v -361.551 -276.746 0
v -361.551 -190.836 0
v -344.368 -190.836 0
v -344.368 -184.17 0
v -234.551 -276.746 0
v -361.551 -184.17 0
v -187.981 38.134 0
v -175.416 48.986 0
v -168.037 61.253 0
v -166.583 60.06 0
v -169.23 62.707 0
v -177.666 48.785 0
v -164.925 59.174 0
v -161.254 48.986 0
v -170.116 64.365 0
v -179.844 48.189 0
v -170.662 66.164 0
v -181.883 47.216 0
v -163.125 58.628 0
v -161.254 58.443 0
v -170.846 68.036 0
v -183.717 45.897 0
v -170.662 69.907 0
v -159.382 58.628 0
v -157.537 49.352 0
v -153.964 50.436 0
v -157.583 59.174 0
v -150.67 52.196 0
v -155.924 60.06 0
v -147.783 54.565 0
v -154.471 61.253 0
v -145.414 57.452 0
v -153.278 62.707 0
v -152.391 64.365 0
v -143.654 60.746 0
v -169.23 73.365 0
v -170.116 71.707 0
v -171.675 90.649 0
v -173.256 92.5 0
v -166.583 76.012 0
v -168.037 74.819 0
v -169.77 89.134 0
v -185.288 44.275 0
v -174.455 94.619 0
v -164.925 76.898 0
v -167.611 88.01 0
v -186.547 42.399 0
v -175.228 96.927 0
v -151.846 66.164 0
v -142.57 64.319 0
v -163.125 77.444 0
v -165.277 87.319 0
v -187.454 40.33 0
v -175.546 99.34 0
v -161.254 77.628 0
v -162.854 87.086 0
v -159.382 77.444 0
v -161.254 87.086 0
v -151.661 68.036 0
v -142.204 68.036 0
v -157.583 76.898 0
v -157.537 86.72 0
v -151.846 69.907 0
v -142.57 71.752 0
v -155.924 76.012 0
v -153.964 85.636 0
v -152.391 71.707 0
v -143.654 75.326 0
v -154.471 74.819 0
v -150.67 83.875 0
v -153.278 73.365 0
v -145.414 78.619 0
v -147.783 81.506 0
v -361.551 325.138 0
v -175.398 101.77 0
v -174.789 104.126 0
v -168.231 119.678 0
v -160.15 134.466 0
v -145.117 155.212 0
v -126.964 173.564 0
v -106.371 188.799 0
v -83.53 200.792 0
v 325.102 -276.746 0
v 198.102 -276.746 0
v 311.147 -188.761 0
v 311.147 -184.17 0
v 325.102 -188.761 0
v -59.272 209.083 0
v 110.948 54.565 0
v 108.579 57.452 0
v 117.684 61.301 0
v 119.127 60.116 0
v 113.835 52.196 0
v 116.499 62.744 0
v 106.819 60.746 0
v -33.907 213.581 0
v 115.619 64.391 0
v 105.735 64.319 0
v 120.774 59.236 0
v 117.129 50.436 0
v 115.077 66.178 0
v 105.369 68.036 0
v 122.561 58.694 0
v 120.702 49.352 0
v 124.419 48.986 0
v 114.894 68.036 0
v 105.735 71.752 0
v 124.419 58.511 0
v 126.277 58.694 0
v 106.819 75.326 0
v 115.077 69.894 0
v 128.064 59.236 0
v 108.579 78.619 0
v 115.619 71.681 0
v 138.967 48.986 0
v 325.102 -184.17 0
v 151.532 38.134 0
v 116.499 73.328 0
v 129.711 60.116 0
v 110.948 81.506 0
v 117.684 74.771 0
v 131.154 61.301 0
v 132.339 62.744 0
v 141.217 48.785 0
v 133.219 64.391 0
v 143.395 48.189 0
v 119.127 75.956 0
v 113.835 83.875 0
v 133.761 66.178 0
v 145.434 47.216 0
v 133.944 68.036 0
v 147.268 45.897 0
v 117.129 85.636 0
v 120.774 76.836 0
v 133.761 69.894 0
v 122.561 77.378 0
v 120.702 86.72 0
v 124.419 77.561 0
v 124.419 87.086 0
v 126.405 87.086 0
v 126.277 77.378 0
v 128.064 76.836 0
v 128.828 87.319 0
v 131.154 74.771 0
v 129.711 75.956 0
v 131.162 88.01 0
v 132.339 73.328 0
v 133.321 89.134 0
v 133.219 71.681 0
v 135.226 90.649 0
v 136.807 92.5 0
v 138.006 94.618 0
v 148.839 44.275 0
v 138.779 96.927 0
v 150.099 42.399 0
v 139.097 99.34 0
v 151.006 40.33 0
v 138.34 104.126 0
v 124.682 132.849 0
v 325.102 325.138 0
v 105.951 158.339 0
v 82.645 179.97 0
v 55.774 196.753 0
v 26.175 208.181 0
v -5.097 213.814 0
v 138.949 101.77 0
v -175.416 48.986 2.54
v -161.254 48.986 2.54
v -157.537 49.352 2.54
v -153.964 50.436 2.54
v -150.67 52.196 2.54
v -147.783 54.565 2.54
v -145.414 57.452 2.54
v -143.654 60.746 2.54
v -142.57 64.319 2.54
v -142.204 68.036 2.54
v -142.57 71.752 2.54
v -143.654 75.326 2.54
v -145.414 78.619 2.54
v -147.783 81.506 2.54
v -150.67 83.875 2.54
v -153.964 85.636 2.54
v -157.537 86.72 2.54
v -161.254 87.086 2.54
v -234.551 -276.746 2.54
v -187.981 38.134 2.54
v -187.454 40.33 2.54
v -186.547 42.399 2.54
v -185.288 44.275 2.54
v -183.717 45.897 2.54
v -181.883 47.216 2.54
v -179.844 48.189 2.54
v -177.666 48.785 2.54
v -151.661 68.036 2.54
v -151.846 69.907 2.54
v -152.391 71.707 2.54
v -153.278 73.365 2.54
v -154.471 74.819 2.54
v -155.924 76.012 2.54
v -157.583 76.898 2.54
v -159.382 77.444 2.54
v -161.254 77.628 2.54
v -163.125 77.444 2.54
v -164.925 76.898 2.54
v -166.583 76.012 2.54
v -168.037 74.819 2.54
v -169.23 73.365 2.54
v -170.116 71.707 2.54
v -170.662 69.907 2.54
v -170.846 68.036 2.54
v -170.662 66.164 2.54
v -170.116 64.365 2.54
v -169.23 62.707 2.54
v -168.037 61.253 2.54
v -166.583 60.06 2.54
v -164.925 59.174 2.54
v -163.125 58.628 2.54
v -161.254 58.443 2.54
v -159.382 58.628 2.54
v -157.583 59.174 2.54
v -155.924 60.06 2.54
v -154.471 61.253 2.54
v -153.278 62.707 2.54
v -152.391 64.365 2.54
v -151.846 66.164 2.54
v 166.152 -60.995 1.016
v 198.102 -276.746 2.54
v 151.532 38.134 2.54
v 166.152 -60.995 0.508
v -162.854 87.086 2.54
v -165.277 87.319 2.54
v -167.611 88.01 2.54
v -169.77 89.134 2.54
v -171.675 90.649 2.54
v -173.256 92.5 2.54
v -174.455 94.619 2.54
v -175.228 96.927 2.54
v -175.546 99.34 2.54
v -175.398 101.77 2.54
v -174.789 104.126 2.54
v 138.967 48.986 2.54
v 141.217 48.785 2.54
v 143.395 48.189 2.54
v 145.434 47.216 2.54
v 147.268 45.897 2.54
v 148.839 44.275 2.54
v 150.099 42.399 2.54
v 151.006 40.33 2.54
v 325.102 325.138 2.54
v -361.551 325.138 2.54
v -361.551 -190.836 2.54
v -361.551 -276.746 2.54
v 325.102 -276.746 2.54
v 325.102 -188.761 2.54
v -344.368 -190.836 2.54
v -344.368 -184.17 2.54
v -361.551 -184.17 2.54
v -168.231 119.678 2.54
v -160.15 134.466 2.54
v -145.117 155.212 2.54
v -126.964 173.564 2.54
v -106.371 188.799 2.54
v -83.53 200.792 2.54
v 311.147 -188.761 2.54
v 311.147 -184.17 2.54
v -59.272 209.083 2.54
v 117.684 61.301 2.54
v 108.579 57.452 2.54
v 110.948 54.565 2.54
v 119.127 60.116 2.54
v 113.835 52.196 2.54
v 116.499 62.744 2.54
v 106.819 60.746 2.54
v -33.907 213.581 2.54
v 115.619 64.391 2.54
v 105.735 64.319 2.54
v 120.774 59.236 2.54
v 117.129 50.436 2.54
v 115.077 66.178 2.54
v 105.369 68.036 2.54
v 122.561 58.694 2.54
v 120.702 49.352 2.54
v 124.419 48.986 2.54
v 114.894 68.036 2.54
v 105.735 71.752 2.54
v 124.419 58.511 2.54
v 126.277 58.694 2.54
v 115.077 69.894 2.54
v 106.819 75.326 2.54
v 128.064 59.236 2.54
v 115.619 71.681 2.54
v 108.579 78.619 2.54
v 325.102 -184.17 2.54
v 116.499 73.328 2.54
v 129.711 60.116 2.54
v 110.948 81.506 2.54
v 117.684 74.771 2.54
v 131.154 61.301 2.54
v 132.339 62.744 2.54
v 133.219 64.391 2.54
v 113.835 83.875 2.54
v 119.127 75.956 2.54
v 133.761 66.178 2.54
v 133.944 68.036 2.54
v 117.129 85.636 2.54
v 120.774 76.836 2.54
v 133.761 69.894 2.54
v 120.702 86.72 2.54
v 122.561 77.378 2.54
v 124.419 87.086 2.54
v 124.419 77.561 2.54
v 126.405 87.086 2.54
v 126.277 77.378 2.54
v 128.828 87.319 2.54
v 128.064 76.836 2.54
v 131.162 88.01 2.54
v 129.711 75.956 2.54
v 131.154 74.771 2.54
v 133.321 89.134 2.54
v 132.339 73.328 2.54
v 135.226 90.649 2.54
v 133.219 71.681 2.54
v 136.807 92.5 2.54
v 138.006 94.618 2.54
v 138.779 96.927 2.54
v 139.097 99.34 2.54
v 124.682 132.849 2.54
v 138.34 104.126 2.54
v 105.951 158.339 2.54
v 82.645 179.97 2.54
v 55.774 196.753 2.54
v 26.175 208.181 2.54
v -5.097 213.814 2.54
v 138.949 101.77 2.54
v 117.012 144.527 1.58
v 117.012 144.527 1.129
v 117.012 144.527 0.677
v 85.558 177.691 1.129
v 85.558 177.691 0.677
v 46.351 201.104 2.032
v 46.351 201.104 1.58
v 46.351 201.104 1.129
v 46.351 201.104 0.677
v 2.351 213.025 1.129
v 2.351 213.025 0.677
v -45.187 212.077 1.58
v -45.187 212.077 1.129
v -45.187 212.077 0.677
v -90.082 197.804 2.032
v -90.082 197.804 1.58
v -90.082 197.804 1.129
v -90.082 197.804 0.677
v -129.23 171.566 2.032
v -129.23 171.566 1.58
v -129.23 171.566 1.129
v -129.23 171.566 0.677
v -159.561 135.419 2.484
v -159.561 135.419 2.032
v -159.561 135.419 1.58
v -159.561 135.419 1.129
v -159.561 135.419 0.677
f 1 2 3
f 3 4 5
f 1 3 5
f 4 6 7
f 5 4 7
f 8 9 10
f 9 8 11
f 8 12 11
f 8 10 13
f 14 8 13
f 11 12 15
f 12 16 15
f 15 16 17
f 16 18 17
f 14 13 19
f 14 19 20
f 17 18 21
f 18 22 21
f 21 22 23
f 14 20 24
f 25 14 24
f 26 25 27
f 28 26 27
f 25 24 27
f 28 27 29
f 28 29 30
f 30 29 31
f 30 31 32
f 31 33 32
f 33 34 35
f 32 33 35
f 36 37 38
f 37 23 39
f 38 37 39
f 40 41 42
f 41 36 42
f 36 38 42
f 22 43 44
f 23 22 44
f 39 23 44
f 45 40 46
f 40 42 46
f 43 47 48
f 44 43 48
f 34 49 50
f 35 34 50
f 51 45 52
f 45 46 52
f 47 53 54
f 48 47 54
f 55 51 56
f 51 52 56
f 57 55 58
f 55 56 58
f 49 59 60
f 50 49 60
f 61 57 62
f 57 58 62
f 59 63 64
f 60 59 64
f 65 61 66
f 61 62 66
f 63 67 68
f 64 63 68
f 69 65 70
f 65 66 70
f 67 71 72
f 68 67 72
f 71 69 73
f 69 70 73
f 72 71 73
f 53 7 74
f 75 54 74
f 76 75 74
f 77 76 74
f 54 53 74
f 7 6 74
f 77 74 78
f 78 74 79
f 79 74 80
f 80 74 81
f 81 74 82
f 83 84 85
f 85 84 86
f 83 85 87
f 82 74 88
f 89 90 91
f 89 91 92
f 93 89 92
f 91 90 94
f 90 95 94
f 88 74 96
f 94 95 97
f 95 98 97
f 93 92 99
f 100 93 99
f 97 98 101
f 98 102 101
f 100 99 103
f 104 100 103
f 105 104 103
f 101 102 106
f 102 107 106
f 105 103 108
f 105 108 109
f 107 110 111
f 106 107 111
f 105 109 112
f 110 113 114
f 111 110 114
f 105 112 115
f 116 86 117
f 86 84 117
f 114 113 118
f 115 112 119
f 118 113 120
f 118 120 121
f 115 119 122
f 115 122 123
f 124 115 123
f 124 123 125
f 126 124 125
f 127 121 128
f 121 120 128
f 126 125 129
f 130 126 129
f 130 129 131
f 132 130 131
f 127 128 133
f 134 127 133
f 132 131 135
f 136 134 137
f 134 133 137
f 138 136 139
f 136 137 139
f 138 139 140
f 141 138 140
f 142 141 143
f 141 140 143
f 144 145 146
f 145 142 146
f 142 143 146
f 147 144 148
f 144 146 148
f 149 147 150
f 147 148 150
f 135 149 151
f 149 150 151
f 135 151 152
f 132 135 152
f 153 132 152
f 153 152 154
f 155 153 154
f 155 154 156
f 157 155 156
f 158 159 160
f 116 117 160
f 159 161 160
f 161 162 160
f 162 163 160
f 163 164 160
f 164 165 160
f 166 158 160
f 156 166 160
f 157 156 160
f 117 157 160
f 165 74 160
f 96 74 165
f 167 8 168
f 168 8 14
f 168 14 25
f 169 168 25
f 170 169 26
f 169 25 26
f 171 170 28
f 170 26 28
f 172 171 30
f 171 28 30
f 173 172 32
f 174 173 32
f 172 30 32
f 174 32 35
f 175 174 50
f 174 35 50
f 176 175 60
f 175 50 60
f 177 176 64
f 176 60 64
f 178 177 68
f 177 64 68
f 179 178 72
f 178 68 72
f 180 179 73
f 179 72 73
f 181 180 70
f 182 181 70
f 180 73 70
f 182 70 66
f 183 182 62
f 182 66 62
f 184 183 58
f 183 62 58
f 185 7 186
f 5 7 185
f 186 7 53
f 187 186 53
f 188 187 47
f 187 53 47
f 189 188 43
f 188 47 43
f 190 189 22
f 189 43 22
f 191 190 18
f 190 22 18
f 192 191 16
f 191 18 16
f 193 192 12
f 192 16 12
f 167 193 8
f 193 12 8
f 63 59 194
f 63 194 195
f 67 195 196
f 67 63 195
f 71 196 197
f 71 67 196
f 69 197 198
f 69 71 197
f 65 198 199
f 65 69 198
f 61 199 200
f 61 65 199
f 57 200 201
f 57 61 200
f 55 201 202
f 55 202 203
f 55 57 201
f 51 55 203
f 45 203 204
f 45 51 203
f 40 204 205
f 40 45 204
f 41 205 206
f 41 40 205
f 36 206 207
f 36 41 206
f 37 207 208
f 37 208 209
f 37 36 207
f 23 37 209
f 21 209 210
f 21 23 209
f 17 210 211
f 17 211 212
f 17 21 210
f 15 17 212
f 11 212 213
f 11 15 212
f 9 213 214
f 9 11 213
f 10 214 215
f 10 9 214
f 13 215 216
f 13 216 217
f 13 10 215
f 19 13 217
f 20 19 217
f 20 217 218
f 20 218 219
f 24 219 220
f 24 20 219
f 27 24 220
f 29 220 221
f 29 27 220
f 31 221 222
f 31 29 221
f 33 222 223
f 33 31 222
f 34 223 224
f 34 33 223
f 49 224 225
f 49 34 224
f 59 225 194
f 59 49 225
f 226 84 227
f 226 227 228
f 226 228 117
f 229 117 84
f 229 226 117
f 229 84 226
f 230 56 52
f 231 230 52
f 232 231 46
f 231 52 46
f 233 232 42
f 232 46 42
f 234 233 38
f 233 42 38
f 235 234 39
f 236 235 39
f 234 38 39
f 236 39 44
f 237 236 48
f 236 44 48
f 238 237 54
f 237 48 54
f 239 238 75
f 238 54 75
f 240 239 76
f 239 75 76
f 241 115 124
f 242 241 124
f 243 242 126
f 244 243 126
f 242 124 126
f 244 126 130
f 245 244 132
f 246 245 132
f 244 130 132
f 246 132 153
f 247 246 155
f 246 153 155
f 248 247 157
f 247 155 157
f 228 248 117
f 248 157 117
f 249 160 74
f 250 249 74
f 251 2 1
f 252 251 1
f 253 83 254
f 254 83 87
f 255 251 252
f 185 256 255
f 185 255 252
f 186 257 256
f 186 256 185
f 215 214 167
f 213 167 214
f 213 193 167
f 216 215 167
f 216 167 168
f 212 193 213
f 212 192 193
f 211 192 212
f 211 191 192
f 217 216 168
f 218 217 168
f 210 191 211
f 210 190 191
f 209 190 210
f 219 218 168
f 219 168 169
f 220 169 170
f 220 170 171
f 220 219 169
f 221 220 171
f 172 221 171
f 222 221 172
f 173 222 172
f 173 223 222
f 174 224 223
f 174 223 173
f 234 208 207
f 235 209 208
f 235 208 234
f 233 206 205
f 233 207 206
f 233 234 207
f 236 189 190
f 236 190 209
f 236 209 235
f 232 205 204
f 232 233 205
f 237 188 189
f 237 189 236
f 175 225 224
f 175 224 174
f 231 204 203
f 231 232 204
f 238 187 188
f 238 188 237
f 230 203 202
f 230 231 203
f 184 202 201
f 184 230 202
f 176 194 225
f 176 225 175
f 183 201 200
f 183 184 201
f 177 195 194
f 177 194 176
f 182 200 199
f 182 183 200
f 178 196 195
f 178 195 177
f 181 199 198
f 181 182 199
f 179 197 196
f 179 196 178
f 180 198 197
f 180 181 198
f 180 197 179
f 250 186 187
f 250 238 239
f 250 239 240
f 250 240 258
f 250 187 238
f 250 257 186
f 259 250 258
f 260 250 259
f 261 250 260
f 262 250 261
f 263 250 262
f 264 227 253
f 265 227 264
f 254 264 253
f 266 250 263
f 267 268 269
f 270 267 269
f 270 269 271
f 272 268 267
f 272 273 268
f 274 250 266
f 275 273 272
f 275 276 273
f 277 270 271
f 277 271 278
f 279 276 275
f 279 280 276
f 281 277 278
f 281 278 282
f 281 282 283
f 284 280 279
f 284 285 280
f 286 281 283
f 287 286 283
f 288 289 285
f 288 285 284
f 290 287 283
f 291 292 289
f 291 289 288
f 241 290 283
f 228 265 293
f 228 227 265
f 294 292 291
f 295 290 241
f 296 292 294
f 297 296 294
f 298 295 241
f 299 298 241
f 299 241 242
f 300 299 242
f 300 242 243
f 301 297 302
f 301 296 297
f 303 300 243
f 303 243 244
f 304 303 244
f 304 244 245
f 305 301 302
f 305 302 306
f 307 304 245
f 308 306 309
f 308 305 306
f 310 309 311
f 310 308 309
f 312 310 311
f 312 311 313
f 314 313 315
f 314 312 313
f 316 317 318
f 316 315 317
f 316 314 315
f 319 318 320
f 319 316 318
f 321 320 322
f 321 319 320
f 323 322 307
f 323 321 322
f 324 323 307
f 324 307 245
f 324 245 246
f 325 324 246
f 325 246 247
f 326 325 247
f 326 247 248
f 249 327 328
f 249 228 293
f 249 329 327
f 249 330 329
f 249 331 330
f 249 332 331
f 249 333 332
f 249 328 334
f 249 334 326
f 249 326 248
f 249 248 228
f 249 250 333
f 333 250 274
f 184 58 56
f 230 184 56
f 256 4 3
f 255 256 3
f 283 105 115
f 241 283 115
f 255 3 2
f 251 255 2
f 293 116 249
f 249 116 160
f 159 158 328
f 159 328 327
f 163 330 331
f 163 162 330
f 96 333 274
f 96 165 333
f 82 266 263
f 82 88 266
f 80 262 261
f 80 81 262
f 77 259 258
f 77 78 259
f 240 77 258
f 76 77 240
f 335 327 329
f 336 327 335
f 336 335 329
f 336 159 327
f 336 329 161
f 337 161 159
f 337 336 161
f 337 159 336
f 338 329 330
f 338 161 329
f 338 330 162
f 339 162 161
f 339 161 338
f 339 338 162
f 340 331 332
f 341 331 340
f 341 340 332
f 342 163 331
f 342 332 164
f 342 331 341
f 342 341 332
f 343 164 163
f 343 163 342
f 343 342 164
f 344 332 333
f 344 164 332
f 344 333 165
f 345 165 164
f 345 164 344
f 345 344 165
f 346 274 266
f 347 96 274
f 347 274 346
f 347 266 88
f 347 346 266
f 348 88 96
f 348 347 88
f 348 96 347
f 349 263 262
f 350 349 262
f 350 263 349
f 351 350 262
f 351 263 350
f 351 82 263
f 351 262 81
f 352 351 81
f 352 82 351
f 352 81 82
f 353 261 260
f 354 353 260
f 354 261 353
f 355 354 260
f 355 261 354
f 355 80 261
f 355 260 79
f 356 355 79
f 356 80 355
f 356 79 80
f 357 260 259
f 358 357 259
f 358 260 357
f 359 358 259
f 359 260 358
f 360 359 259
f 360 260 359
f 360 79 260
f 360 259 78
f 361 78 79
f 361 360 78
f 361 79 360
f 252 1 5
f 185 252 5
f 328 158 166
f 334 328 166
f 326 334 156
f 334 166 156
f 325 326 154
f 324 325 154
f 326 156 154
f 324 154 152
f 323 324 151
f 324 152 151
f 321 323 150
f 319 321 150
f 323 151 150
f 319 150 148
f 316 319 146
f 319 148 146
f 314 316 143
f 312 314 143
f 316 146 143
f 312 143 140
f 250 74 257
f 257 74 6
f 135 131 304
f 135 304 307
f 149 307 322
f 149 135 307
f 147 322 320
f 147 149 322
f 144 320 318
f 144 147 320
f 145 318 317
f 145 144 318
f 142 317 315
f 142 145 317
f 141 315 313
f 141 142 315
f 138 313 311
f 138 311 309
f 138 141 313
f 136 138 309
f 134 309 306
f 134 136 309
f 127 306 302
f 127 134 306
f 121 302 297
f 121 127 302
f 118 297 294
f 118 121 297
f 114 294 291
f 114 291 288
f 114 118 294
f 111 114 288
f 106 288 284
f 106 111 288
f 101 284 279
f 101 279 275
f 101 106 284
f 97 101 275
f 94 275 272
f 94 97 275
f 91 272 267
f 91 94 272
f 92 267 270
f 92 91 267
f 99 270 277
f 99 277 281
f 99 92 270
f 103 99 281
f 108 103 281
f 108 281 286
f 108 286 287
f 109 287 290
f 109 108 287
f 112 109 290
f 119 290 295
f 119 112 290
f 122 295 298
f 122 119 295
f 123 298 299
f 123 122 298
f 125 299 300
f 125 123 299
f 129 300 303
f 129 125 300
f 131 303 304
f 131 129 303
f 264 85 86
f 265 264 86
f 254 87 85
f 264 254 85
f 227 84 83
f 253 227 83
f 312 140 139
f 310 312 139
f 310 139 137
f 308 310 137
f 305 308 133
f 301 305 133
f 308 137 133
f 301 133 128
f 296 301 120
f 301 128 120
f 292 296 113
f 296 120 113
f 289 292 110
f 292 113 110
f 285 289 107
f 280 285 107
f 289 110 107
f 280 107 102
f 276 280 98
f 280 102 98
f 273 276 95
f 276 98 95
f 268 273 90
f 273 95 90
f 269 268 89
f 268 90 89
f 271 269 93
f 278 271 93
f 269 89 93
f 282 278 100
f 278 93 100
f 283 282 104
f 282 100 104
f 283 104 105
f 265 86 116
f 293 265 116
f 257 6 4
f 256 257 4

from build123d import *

# Parameters (mm, degrees)
SKETCH1_R           = 9.592533987
SKETCH1_R_2         = 9.525
BOSS_EXTRUDE1_DEPTH = 2.54


with BuildPart() as part:
    # Sketch1 → Boss-Extrude1 (new body)
    with BuildSketch(Plane.XY):
        with BuildLine():
            Line((325.101849056, -276.74558404), (325.101849056, -188.761052666))
            Line((325.101849056, -188.761052666), (311.147367129, -188.761052666))
            Line((311.147367129, -188.761052666), (311.147367129, -184.170327252))
            Line((311.147367129, -184.170327252), (325.101849056, -184.170327252))
            Line((325.101849056, -184.170327252), (325.101849056, 325.138013642))
            Line((325.101849056, 325.138013642), (-361.55061518, 325.138013642))
            Line((-361.55061518, 325.138013642), (-361.55061518, -184.170327252))
            Line((-361.55061518, -184.170327252), (-344.367661442, -184.170327252))
            Line((-344.367661442, -184.170327252), (-344.367661442, -190.835742865))
            Line((-344.367661442, -190.835742865), (-361.55061518, -190.835742865))
            Line((-361.55061518, -190.835742865), (-361.55061518, -276.74558404))
            Line((-361.55061518, -276.74558404), (-234.55061518, -276.74558404))
            add(Edge.make_bspline(
                [(-187.980509507, 38.133773771), (-188.27489671, 36.13210674), (-188.569257118, 34.130435751), (-190.3693668, 21.889980342), (-191.876305024, 11.651371561), (-196.404427488, -19.063375229), (-199.428229196, -39.539126569), (-205.483427481, -80.489507286), (-208.515826842, -100.963988527), (-219.215042163, -173.207603441), (-226.881928481, -224.976726722), (-234.55061518, -276.74558404)],
                knots=[0.775140665, 0.775140665, 0.775140665, 0.775140665, 0.78125, 0.78125, 0.8125, 0.8125, 0.875, 0.875, 0.9375, 0.9375, 1.095529214, 1.095529214, 1.095529214, 1.095529214], degree=3))
            ThreePointArc((-187.980509507, 38.133773771), (-183.716916528, 45.897266013), (-175.41567054, 48.985850142))
            Line((-175.41567054, 48.985850142), (-161.253773138, 48.985850142))
            ThreePointArc((-161.253773138, 48.985850142), (-142.203773138, 68.035850142), (-161.253773138, 87.085850141))
            Line((-161.253773138, 87.085850141), (-162.853778681, 87.085850141))
            ThreePointArc((-162.853778681, 87.085850141), (-173.256071513, 92.500089794), (-174.788993269, 104.126432214))
            add(Edge.make_bspline(
                [(138.340023196, 104.1264177), (138.155537808, 104.633695525), (137.968537838, 105.140328765), (136.878523505, 108.050508672), (135.441958767, 111.634797813), (133.873557403, 115.185292105), (132.798253571, 117.544674285), (132.244938124, 118.72221102), (129.414540718, 124.567063869), (126.94937257, 129.101743153), (121.630471343, 137.897930344), (118.776746577, 142.159444094), (112.686474548, 150.413337301), (107.831924529, 156.402096918), (102.540177193, 162.083495309), (99.819602382, 164.871677634), (98.900271279, 165.792240869), (97.046227751, 167.606080988), (96.110329243, 168.500592287), (91.386634358, 172.911358508), (87.466457166, 176.242558862), (79.351868776, 182.521609038), (75.1575089, 185.469530602), (66.495709426, 190.983636766), (62.02828952, 193.549848892), (55.115179884, 197.102841468), (52.770906129, 198.23944579), (48.057920232, 200.390162802), (45.684402026, 201.406997485), (38.513619271, 204.284843788), (33.666257106, 205.973646323), (23.839984133, 208.89905679), (18.861006507, 210.13543504), (11.293001851, 211.647842714), (8.753729317, 212.094901761), (4.919604431, 212.678810774), (3.63735506, 212.858983123), (1.064351829, 213.190093886), (-0.227403309, 213.341124006), (-4.104657388, 213.748796074), (-6.69392087, 213.960280793), (-10.584377098, 214.188154302), (-11.882288513, 214.24923116), (-14.480247284, 214.34229574), (-15.77998427, 214.375695042), (-18.379751713, 214.405675513), (-19.679864546, 214.392033292), (-22.279014783, 214.333304532), (-23.578445595, 214.289247872), (-27.473045877, 214.113425657), (-30.064936685, 213.93719921), (-35.239513244, 213.464285113), (-37.82599866, 213.167115032), (-42.960254521, 212.456338993), (-45.510284017, 212.042773536), (-53.109929228, 210.630443886), (-58.109124925, 209.46012554), (-67.974579463, 206.667171099), (-72.840887694, 205.044703051), (-80.039629101, 202.268297913), (-83.613765485, 200.794235552), (-87.149475357, 199.189426954), (-89.497993793, 198.090219969), (-90.669429689, 197.525202002), (-96.484812077, 194.636054099), (-100.994154698, 192.125739674), (-109.738071064, 186.722649456), (-113.972669304, 183.829907758), (-122.167753951, 177.662877555), (-126.128054678, 174.388330596), (-131.857503737, 169.182808313), (-133.731998876, 167.398469262), (-136.490242047, 164.64749262), (-137.400625577, 163.718129876), (-139.194142166, 161.84440698), (-140.078494423, 160.898848159), (-144.439064905, 156.128155654), (-147.732037091, 152.174555571), (-153.934907403, 143.998797648), (-156.844744983, 139.776597363), (-162.276947412, 131.060555304), (-164.799263726, 126.566679506), (-168.283130528, 119.615822968), (-169.395978502, 117.259661658), (-171.499158951, 112.524180704), (-172.492247577, 110.139827958), (-173.895945336, 106.538995231), (-174.349562031, 105.334727793), (-174.788993269, 104.126432214)],
                knots=[0.295230777, 0.295230777, 0.295230777, 0.295230777, 0.296875, 0.296875, 0.3046875, 0.30859375, 0.30859375, 0.3125, 0.3125, 0.328125, 0.328125, 0.34375, 0.34375, 0.359375, 0.3671875, 0.3671875, 0.37109375, 0.37109375, 0.375, 0.375, 0.390625, 0.390625, 0.40625, 0.40625, 0.421875, 0.421875, 0.4296875, 0.4296875, 0.4375, 0.4375, 0.453125, 0.453125, 0.46875, 0.46875, 0.4765625, 0.4765625, 0.48046875, 0.48046875, 0.484375, 0.484375, 0.4921875, 0.4921875, 0.49609375, 0.49609375, 0.5, 0.5, 0.50390625, 0.50390625, 0.5078125, 0.5078125, 0.515625, 0.515625, 0.5234375, 0.5234375, 0.53125, 0.53125, 0.546875, 0.546875, 0.5625, 0.5625, 0.5703125, 0.57421875, 0.57421875, 0.578125, 0.578125, 0.59375, 0.59375, 0.609375, 0.609375, 0.625, 0.625, 0.6328125, 0.6328125, 0.63671875, 0.63671875, 0.640625, 0.640625, 0.65625, 0.65625, 0.671875, 0.671875, 0.6875, 0.6875, 0.6953125, 0.6953125, 0.703125, 0.703125, 0.707030961, 0.707030961, 0.707030961, 0.707030961], degree=3))
            ThreePointArc((138.340023196, 104.1264177), (136.807091731, 92.500083469), (126.404803329, 87.085850141))
            Line((126.404803329, 87.085850141), (124.418789558, 87.085850141))
            ThreePointArc((124.418789558, 87.085850141), (105.368789558, 68.035850142), (124.418789558, 48.985850142))
            Line((124.418789558, 48.985850142), (138.966782744, 48.985850142))
            ThreePointArc((138.966782744, 48.985850142), (147.268029336, 45.897265491), (151.531621943, 38.133772192))
            add(Edge.make_bspline(
                [(198.101849056, -276.74558404), (190.457207742, -225.140201219), (182.814584349, -173.534519662), (172.163765006, -101.617813639), (169.155561459, -81.306790297), (163.148374331, -40.683378675), (160.148663276, -20.371098521), (155.656220674, 10.098370509), (154.16095032, 20.255186016), (152.288653907, 32.986071489), (151.910159921, 35.559925083), (151.531621943, 38.133772192)],
                knots=[-0.096298018, -0.096298018, -0.096298018, -0.096298018, 0.0625, 0.0625, 0.125, 0.125, 0.1875, 0.1875, 0.21875, 0.21875, 0.22666892, 0.22666892, 0.22666892, 0.22666892], degree=3))
            Line((198.101849056, -276.74558404), (325.101849056, -276.74558404))
        make_face()
        with Locations((-161.253773138, 68.035850142)):
            Circle(SKETCH1_R, mode=Mode.SUBTRACT)
        with Locations((124.418789558, 68.035850142)):
            Circle(SKETCH1_R_2, mode=Mode.SUBTRACT)
    extrude(amount=BOSS_EXTRUDE1_DEPTH)


solid = part.part
